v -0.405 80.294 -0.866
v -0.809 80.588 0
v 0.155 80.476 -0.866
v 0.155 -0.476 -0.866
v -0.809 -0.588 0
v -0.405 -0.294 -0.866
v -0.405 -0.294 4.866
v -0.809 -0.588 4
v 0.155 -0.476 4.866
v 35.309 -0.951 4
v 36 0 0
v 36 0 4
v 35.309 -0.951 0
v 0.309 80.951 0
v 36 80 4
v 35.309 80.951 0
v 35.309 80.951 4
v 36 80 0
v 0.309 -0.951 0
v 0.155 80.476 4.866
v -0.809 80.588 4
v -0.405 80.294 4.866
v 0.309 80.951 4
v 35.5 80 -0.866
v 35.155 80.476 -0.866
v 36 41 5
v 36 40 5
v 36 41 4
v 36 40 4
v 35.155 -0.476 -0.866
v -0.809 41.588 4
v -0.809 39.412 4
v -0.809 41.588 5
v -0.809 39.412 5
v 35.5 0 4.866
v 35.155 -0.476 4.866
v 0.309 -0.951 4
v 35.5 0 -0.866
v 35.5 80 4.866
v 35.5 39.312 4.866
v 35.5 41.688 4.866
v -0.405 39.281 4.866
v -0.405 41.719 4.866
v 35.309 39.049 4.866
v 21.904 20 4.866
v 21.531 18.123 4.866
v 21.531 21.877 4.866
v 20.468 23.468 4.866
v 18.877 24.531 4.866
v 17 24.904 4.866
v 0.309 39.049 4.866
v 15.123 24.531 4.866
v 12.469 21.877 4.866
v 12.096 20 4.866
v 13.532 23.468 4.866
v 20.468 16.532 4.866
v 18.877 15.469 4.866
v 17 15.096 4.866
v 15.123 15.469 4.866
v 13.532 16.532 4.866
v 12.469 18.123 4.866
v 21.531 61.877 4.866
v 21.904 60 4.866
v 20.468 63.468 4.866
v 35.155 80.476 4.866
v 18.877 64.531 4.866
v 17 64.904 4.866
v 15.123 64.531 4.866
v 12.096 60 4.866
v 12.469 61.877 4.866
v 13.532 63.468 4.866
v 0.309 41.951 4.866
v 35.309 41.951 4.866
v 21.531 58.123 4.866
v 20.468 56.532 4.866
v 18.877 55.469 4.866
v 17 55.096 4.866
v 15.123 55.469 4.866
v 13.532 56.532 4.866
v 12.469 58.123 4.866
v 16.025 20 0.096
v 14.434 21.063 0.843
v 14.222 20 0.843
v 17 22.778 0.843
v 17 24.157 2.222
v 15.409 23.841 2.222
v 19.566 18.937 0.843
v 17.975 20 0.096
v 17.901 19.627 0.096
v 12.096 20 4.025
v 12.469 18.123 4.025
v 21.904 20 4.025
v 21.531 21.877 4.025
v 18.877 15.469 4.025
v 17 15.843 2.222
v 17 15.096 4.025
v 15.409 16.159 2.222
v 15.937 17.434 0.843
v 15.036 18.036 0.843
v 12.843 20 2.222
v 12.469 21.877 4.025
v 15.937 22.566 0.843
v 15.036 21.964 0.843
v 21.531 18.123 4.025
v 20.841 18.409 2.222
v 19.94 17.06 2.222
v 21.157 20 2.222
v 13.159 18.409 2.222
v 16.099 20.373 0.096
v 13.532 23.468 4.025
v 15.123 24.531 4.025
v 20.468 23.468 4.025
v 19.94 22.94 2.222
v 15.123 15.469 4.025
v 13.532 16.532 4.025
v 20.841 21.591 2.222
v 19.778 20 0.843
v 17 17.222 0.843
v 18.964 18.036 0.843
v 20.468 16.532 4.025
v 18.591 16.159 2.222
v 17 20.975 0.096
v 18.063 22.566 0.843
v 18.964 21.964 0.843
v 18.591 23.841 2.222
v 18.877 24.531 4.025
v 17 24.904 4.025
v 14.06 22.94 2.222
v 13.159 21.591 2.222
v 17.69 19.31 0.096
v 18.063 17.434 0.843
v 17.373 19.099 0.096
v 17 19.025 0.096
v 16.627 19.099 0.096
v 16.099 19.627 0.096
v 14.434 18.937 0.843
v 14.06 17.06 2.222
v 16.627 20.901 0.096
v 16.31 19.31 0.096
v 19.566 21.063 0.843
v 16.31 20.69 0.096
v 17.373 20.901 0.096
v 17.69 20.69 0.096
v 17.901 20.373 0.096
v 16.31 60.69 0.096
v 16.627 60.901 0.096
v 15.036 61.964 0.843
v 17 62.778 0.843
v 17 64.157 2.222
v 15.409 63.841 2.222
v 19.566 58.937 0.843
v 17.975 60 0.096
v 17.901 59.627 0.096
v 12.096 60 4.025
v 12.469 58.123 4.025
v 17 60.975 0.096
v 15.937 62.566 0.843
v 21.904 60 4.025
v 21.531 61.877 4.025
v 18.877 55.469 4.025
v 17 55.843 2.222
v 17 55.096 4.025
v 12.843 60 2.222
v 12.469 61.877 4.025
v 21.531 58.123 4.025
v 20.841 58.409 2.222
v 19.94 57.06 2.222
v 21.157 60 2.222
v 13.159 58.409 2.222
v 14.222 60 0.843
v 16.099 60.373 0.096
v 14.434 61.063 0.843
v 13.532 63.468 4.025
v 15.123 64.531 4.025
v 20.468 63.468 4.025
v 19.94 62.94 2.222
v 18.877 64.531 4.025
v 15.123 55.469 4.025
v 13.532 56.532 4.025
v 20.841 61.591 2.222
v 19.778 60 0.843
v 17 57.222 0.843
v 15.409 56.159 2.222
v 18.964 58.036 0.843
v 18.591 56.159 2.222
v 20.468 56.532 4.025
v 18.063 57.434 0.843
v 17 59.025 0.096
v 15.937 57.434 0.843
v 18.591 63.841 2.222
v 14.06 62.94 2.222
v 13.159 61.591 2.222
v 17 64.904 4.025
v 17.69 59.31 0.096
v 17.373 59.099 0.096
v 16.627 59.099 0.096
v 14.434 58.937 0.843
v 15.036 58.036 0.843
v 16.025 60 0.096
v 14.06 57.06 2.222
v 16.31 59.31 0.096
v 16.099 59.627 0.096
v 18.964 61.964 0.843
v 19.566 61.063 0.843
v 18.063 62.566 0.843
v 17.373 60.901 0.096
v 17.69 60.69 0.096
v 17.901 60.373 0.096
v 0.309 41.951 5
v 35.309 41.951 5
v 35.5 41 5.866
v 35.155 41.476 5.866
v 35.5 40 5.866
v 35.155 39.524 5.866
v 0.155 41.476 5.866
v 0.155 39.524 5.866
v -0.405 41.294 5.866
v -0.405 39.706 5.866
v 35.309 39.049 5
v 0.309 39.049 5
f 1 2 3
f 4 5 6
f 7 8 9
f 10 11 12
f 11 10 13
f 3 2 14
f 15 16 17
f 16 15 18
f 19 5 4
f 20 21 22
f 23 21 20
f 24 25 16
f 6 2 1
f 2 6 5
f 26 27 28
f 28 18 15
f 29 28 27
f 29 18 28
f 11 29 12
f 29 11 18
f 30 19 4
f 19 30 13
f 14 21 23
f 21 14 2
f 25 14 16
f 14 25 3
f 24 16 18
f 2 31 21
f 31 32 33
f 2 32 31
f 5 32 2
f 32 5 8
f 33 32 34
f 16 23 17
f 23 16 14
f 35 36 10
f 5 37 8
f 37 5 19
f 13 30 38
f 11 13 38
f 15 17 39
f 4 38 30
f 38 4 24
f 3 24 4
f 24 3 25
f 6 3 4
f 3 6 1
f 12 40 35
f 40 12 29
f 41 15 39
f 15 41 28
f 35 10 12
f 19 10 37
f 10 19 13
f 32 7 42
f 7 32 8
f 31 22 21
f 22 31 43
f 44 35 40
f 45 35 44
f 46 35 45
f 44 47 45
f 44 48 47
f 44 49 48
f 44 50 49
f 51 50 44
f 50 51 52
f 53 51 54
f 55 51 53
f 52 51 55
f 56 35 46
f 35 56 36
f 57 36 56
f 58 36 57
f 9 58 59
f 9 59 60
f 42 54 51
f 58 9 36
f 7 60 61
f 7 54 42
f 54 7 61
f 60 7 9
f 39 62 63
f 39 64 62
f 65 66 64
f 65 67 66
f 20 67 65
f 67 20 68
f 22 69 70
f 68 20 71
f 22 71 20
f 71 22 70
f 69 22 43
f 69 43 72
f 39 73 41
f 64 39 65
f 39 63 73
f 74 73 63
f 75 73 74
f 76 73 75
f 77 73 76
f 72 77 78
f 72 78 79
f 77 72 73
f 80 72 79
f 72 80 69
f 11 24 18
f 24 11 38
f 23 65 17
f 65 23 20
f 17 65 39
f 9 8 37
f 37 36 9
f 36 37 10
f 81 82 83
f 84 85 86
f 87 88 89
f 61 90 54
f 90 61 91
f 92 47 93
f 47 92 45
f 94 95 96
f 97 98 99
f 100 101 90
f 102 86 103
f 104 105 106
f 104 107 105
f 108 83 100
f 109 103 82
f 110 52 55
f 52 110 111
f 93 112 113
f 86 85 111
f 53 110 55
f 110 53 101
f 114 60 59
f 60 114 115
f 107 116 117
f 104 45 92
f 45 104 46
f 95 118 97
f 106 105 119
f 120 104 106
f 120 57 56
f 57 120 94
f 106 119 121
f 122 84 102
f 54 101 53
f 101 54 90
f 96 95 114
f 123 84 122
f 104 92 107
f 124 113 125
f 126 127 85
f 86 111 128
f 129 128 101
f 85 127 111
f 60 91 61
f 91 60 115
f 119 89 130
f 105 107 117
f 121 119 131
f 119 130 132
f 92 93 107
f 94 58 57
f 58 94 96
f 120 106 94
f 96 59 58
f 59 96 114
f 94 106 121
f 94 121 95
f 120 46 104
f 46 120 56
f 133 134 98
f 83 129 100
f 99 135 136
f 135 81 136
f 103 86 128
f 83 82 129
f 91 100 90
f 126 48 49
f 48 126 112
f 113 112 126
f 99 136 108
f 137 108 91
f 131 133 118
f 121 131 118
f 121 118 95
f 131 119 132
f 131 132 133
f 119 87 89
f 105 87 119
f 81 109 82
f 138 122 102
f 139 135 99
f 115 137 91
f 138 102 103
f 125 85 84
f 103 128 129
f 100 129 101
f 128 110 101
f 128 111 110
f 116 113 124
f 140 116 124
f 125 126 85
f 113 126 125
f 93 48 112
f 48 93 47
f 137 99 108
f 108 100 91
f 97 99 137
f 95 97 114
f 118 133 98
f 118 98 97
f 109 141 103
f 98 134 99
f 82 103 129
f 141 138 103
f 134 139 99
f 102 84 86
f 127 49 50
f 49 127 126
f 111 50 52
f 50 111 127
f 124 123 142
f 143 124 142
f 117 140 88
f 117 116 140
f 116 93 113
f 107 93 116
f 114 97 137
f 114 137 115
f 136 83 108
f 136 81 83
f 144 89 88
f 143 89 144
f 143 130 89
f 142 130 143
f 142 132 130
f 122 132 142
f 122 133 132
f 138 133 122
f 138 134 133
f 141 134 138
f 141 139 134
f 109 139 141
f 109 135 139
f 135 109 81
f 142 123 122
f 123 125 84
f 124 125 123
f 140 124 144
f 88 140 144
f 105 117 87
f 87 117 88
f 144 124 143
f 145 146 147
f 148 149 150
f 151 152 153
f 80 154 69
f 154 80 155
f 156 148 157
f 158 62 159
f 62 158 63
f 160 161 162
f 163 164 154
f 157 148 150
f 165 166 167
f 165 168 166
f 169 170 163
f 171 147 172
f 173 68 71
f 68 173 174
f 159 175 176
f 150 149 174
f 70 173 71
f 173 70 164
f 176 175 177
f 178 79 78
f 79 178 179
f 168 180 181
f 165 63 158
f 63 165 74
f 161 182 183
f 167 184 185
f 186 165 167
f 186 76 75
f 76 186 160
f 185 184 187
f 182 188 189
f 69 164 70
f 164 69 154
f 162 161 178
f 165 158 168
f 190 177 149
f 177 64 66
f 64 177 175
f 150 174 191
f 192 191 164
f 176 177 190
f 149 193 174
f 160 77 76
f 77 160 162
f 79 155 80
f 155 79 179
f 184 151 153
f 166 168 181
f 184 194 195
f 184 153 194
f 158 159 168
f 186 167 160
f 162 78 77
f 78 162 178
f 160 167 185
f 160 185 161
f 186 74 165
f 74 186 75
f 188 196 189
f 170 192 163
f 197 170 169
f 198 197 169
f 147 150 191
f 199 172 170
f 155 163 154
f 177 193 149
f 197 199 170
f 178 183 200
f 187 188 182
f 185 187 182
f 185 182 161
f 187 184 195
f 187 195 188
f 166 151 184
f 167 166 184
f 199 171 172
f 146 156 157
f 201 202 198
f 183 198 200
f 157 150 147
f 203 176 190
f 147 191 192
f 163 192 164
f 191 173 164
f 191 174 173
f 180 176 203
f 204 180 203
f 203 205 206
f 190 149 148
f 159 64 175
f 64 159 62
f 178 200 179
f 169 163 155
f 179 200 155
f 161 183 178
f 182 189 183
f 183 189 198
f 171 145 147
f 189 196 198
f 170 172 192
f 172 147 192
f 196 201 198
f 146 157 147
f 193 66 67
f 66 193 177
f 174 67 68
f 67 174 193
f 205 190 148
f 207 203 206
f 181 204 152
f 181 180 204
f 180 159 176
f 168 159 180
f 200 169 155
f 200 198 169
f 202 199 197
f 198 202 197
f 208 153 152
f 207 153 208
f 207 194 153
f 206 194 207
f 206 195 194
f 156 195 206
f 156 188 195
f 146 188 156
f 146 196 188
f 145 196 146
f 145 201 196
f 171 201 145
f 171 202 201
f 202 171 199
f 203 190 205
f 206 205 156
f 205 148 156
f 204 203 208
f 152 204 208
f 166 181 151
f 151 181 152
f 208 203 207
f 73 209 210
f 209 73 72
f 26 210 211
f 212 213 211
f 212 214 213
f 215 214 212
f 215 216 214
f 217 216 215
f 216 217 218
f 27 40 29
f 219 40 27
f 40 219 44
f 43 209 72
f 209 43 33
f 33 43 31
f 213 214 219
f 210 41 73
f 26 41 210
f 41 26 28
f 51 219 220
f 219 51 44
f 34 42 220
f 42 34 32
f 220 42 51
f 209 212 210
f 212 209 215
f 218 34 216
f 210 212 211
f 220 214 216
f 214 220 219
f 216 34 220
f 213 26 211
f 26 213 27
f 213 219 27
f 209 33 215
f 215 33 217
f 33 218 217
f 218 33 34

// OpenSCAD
// Loguncov Maxim 13.12.13


//$fn=128;


translate([0,40,0])
minkowski()
{cube([35,1,5]);
sphere(1);
}

difference() {

//основа
minkowski()
{cube([35,80,4]);
sphere(1);
}

//отверстия
translate([17,20,5])sphere(5);

translate([17,60,5])sphere(5);




}
